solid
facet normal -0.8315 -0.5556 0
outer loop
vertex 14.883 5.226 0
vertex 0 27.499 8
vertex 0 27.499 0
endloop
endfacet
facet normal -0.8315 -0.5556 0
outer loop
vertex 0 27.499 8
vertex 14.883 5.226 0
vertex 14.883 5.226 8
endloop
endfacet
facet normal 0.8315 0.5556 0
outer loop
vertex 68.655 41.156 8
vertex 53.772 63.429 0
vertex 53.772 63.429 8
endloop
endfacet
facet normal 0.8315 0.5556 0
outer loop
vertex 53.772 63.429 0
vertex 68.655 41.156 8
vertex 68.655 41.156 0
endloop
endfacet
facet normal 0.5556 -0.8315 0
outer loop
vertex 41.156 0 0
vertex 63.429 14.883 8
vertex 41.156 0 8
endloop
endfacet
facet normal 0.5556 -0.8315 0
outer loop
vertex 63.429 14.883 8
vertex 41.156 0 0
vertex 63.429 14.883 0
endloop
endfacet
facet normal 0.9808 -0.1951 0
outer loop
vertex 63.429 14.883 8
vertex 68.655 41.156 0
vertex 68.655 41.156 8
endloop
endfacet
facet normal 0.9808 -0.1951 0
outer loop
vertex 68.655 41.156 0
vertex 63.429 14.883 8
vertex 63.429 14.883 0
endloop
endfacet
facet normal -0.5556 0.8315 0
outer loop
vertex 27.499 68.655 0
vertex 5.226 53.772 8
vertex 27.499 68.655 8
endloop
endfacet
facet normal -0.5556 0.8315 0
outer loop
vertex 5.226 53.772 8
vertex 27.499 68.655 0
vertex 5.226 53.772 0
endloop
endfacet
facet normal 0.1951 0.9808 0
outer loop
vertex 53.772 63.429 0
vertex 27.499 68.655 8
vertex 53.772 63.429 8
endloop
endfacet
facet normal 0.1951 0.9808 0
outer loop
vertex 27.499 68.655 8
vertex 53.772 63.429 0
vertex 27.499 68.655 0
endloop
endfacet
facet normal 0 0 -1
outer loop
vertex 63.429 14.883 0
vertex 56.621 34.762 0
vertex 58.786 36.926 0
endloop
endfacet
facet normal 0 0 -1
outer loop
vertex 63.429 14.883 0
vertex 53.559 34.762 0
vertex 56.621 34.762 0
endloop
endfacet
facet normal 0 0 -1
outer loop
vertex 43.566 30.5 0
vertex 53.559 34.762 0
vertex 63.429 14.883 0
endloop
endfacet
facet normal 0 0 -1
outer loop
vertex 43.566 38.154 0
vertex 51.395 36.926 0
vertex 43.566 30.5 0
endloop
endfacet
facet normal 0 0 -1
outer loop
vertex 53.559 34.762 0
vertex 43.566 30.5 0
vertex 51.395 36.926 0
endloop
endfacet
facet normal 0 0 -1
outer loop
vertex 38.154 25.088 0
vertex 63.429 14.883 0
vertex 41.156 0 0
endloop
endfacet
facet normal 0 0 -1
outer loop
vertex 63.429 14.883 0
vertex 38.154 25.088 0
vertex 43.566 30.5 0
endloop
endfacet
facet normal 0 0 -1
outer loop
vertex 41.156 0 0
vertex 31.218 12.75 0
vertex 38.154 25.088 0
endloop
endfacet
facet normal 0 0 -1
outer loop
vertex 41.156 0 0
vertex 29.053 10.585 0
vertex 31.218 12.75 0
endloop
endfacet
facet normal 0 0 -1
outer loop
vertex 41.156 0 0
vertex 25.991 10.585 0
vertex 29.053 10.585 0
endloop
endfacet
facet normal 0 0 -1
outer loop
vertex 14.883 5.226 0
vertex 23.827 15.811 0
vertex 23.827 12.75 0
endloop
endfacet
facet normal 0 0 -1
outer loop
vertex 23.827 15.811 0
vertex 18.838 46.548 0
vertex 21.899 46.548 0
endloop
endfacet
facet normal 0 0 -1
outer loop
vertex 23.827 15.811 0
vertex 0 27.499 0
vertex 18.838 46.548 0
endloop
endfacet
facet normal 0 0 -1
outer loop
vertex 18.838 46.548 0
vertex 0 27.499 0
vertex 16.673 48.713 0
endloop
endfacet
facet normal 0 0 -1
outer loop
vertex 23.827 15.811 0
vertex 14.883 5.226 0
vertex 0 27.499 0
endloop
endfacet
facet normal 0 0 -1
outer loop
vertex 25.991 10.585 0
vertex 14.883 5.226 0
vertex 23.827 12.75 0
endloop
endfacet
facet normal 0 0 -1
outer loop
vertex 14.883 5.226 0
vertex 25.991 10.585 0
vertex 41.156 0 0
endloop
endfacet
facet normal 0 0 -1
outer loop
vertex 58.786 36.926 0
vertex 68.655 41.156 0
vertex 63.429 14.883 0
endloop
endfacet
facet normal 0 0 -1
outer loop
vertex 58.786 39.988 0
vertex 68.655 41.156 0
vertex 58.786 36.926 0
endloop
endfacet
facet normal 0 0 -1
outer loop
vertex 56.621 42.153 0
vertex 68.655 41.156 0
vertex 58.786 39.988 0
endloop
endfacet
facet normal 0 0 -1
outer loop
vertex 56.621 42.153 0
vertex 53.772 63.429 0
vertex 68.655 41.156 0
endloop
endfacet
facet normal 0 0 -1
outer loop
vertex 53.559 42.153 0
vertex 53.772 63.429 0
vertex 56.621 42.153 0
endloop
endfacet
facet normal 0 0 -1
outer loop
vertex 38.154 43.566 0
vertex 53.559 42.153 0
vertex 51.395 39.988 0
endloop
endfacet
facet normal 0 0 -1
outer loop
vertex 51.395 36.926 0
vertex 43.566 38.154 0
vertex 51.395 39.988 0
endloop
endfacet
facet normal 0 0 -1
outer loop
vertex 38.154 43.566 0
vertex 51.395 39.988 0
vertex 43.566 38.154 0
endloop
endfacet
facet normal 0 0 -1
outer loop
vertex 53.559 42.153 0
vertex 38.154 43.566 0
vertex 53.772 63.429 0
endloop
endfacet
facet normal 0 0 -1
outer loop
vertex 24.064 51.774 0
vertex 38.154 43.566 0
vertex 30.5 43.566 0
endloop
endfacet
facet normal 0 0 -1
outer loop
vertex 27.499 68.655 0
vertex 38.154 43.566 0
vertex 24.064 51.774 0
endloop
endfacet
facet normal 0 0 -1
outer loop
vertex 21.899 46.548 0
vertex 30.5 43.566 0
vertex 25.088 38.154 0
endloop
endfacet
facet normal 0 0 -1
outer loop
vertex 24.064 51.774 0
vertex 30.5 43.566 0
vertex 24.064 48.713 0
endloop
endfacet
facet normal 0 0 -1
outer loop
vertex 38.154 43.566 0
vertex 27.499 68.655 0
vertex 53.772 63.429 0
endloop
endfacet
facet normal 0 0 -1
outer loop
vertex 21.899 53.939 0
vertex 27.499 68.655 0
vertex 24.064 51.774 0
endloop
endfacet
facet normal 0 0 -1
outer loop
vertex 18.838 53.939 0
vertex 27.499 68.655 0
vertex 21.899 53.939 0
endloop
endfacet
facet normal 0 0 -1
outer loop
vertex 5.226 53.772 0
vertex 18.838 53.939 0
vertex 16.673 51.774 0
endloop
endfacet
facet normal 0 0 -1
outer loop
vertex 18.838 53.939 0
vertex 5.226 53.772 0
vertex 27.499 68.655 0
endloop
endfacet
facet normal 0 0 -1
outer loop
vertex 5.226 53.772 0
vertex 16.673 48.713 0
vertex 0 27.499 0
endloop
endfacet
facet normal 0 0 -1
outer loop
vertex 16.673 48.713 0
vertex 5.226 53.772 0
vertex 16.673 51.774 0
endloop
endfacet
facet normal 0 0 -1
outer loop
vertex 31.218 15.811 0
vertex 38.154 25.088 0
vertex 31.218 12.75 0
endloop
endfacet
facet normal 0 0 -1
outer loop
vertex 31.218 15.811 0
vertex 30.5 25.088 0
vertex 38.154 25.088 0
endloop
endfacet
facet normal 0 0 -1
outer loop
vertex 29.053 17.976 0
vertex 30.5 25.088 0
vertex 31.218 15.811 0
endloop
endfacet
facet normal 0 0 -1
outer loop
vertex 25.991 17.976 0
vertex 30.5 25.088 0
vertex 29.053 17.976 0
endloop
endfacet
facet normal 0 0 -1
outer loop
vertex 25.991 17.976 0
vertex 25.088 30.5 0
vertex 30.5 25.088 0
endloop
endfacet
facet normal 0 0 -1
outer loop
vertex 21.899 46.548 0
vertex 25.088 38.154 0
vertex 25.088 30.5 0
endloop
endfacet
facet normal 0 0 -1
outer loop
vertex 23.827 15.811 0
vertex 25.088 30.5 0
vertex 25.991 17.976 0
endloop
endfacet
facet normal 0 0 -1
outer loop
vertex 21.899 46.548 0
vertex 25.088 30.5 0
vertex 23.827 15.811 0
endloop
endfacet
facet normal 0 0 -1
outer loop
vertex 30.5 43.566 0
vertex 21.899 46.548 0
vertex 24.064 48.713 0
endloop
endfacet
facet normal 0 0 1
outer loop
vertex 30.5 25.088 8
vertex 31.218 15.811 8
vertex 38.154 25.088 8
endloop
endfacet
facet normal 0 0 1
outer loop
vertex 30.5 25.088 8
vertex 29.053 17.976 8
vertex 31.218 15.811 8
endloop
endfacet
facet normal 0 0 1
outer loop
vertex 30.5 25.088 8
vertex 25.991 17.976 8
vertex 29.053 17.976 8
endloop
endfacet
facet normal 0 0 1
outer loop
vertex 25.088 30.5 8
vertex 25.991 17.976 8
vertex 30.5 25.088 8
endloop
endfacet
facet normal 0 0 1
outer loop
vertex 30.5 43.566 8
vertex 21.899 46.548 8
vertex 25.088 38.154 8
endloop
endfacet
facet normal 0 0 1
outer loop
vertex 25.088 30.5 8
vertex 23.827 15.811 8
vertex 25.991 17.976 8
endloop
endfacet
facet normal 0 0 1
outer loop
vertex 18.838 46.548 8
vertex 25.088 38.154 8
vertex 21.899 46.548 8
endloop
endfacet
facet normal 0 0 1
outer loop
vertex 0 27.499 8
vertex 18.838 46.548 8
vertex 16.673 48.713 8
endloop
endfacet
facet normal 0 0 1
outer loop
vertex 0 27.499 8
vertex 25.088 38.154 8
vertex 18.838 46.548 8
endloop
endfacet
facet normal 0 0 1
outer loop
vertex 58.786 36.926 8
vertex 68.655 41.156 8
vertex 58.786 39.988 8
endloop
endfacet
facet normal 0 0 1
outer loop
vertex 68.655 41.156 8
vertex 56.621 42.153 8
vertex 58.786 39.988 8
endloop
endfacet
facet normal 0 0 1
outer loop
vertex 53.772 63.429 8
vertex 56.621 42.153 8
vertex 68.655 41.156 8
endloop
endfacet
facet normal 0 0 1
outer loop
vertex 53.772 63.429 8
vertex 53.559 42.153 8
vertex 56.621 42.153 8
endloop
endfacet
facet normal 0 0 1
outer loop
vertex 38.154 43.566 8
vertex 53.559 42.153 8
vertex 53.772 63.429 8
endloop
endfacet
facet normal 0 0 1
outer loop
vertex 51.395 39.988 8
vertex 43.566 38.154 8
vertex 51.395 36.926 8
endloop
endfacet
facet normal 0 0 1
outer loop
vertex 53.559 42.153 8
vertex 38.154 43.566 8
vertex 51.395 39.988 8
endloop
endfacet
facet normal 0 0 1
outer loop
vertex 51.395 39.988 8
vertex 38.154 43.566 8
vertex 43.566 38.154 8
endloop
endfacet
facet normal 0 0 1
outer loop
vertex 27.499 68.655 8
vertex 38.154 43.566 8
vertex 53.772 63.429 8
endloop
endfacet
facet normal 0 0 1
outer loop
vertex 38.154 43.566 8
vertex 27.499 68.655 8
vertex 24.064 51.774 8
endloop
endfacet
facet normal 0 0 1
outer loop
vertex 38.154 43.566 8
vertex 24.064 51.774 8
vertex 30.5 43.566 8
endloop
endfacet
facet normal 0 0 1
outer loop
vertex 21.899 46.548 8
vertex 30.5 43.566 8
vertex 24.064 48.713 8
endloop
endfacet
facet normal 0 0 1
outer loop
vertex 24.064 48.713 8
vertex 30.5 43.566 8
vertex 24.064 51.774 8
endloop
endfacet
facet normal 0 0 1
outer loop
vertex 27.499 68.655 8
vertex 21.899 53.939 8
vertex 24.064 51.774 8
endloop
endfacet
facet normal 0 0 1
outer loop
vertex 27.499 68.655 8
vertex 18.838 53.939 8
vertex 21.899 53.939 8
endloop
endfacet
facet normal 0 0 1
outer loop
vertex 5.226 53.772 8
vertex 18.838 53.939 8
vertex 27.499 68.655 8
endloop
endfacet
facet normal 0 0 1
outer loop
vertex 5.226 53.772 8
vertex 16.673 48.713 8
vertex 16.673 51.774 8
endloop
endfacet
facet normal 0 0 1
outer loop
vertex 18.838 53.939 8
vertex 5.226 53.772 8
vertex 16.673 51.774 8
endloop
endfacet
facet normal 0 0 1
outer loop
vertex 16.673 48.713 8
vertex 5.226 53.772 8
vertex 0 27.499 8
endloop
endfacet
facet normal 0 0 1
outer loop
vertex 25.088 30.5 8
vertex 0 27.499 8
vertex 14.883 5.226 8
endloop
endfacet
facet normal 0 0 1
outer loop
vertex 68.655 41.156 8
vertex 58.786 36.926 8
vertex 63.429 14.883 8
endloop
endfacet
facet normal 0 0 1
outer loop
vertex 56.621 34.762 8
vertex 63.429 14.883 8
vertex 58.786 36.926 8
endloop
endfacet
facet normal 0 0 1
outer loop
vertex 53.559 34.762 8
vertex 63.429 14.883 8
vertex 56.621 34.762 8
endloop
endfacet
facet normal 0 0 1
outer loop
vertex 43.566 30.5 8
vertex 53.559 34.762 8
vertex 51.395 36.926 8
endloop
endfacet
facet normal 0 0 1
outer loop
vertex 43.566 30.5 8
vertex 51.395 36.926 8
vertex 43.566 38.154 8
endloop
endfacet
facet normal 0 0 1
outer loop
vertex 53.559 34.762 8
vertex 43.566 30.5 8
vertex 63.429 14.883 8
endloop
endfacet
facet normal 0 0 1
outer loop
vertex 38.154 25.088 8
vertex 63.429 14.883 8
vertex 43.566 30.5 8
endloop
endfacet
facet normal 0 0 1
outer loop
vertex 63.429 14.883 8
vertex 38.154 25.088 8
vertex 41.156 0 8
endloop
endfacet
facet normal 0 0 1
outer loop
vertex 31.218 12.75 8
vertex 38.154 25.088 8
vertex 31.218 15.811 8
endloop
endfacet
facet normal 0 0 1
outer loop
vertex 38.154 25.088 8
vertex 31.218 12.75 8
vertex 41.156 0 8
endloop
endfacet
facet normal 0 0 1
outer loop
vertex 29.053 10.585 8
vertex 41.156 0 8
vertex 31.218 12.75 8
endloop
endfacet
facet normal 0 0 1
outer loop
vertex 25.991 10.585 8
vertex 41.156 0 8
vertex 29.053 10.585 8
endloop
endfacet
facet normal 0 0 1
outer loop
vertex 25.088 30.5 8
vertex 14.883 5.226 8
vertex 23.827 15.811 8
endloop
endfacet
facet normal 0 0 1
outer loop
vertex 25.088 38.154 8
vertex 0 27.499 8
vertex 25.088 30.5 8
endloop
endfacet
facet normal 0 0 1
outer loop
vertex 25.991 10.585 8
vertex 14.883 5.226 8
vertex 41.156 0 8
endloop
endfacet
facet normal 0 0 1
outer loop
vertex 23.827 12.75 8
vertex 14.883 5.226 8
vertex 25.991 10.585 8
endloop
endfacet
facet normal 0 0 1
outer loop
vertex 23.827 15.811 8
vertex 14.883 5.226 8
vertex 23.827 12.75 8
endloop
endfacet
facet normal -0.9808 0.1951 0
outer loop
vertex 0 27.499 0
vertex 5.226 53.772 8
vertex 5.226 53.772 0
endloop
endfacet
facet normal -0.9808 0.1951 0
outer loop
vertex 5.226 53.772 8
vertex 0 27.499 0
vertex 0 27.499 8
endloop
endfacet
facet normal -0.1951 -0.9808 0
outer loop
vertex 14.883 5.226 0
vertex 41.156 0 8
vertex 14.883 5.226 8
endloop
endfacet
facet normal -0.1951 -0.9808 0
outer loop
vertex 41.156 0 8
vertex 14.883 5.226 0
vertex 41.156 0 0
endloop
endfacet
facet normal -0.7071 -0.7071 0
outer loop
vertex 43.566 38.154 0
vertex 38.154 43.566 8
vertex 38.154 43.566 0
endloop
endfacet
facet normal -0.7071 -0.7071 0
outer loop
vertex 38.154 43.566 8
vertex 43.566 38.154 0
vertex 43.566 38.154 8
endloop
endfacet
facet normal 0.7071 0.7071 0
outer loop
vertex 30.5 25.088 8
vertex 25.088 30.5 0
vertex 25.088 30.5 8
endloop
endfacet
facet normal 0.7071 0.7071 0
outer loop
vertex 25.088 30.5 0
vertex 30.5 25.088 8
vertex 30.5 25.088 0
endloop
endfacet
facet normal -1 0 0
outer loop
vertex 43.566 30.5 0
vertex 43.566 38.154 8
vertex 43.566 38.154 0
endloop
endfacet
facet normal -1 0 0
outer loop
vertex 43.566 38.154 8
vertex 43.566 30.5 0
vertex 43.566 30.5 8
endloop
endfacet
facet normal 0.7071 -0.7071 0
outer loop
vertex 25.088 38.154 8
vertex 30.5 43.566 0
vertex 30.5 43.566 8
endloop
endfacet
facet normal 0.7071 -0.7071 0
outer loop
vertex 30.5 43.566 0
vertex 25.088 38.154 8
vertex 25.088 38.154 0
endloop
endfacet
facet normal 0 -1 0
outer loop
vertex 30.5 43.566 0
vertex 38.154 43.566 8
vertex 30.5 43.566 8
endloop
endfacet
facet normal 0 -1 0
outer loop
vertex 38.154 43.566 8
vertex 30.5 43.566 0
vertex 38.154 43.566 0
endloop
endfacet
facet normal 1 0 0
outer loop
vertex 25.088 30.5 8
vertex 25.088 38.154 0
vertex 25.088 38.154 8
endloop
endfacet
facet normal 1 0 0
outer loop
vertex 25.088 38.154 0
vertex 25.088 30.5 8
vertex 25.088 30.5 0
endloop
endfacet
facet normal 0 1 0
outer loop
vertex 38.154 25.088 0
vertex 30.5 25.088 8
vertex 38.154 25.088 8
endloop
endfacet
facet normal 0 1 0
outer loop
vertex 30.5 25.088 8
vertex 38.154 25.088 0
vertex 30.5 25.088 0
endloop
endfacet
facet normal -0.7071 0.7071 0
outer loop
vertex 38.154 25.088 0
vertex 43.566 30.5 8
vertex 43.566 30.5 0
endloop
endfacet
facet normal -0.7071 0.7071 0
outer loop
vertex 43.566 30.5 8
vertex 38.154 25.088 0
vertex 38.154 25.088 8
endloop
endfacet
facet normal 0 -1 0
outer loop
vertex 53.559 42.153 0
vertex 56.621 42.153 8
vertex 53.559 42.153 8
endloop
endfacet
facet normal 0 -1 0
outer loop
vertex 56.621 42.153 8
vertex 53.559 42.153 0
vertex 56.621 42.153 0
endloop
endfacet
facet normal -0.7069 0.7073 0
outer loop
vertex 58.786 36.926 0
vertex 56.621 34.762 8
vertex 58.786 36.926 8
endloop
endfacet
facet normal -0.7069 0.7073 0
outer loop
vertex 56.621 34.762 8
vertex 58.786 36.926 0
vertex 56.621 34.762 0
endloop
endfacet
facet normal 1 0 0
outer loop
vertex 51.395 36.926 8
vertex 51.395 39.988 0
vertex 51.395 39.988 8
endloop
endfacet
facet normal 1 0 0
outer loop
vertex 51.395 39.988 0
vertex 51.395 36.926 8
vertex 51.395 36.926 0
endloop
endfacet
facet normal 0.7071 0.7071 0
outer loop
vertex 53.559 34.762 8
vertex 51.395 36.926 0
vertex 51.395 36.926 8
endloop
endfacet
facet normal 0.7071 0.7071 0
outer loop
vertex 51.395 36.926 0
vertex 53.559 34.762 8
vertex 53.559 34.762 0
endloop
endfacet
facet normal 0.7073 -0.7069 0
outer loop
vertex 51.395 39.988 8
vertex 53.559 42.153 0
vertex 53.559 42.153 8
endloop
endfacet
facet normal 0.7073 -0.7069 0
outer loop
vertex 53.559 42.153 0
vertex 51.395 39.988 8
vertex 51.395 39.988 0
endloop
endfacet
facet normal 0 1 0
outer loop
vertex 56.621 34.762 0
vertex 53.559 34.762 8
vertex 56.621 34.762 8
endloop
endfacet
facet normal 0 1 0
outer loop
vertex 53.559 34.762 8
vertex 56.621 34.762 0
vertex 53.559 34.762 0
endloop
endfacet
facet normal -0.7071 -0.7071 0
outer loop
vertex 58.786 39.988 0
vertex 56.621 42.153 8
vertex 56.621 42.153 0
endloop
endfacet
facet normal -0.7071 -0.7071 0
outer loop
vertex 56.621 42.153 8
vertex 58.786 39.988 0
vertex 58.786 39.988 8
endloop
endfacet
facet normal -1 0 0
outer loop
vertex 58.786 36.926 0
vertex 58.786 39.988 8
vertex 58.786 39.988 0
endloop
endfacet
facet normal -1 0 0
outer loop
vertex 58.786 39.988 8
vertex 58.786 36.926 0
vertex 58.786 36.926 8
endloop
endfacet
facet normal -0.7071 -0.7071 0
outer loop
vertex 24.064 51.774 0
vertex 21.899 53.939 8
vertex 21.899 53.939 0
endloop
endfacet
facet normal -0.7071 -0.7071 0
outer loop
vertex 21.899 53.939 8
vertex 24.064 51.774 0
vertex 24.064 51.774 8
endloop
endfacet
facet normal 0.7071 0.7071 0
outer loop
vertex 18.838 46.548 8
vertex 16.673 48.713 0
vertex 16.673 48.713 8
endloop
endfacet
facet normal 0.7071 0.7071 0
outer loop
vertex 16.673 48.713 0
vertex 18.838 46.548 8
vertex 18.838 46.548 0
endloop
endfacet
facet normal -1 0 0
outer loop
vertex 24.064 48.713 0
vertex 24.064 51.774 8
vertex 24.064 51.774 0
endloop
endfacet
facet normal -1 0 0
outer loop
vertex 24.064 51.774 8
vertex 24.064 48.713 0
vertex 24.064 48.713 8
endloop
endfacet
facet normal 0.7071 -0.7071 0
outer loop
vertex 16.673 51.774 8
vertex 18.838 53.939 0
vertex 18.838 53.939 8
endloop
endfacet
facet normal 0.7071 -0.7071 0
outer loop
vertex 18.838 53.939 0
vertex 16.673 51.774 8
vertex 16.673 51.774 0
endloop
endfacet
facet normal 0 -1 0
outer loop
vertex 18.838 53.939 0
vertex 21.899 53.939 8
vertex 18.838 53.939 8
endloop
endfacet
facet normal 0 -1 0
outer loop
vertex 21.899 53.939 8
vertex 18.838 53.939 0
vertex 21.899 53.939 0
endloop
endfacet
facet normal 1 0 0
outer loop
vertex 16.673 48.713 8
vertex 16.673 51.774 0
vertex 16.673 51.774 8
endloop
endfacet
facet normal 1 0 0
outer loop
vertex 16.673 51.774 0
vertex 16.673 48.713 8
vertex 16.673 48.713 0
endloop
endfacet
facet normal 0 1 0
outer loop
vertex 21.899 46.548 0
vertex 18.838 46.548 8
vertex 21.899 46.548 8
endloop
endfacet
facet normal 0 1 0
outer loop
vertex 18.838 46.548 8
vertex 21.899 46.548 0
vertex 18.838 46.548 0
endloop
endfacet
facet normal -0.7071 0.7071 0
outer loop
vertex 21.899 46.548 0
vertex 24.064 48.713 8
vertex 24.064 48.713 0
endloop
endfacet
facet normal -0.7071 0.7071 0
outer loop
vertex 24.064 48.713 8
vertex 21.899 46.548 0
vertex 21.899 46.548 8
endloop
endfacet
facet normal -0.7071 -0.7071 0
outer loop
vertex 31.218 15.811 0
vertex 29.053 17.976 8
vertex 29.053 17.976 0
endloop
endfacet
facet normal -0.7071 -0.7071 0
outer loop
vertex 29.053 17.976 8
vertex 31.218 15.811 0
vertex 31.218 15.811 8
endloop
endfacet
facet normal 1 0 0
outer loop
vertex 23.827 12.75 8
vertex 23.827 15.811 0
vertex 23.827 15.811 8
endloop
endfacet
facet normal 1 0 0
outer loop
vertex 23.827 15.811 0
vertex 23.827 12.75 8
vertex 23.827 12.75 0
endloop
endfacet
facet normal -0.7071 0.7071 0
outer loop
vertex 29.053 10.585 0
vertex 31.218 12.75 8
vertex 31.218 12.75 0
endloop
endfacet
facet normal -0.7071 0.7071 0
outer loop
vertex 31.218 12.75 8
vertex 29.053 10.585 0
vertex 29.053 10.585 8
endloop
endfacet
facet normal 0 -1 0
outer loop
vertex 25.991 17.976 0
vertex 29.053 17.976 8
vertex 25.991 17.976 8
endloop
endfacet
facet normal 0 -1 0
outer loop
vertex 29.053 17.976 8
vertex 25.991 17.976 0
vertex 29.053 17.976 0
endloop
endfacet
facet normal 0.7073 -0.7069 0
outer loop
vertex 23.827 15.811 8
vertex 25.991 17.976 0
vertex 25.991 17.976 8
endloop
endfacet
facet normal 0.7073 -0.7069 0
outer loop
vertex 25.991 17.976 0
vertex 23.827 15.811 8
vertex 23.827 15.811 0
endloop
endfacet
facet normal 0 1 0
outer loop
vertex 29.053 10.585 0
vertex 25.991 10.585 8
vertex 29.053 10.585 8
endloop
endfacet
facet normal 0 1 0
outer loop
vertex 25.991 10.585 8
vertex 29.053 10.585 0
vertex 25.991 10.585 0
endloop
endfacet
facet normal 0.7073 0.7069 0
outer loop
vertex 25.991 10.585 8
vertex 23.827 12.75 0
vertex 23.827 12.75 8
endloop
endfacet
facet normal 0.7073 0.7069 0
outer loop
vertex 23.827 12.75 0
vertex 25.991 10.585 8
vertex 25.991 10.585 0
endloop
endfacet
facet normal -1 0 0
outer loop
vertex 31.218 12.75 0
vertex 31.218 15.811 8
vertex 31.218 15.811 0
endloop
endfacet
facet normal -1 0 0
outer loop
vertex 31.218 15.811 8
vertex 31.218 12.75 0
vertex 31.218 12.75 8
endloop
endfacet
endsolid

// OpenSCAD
$fn = 32;

// ----------------------------------------------------------------------
// Polygon plate: 8-gon R35, 3 bolt windows
// ----------------------------------------------------------------------

// --- parameters (mm) ---
sides = 8;                // number of polygon sides
plate_r = 35;             // circumscribed radius of the polygon
bore_r = 10;              // centre bore radius
bolts = 3;                // number of bolt windows
ring_r = 21.17;           // bolt-circle radius
bolt_r = 4;               // bolt window radius
plate_t = 8;              // plate thickness, Z (extrusion height)
fit_tol = 0.1;            // declared fit tolerance (prompt contract)
free_tol = 0.5;           // declared free tolerance (prompt contract)

plate_d = 2 * plate_r;  // circumscribed diameter
bore_d = 2 * bore_r;  // centre bore diameter
bolt_d = 2 * bolt_r;  // bolt window diameter
ring_d = 2 * ring_r;  // bolt-circle diameter

profile = [[68.655, 41.156], [53.772, 63.429], [27.499, 68.655], [5.226, 53.772], [0, 27.499], [14.883, 5.226], [41.156, 0], [63.429, 14.883]];  // primary outline, 8 points, counter clockwise
void_1 = [[43.566, 38.154], [38.154, 43.566], [30.5, 43.566], [25.088, 38.154], [25.088, 30.5], [30.5, 25.088], [38.154, 25.088], [43.566, 30.5]];  // centre bore, 8 points
void_2 = [[58.786, 39.988], [56.621, 42.153], [53.559, 42.153], [51.395, 39.988], [51.395, 36.926], [53.559, 34.762], [56.621, 34.762], [58.786, 36.926]];  // bolt window 1, 8 points
void_3 = [[24.064, 51.774], [21.899, 53.939], [18.838, 53.939], [16.673, 51.774], [16.673, 48.713], [18.838, 46.548], [21.899, 46.548], [24.064, 48.713]];  // bolt window 2, 8 points
void_4 = [[31.218, 15.811], [29.053, 17.976], [25.991, 17.976], [23.827, 15.811], [23.827, 12.75], [25.991, 10.585], [29.053, 10.585], [31.218, 12.75]];  // bolt window 3, 8 points

// --- the one profile operation ---
difference() {
  linear_extrude(height = plate_t) polygon(points = profile);
  translate([0, 0, -1])
    linear_extrude(height = plate_t + 2) polygon(points = void_1);
  translate([0, 0, -1])
    linear_extrude(height = plate_t + 2) polygon(points = void_2);
  translate([0, 0, -1])
    linear_extrude(height = plate_t + 2) polygon(points = void_3);
  translate([0, 0, -1])
    linear_extrude(height = plate_t + 2) polygon(points = void_4);
}
